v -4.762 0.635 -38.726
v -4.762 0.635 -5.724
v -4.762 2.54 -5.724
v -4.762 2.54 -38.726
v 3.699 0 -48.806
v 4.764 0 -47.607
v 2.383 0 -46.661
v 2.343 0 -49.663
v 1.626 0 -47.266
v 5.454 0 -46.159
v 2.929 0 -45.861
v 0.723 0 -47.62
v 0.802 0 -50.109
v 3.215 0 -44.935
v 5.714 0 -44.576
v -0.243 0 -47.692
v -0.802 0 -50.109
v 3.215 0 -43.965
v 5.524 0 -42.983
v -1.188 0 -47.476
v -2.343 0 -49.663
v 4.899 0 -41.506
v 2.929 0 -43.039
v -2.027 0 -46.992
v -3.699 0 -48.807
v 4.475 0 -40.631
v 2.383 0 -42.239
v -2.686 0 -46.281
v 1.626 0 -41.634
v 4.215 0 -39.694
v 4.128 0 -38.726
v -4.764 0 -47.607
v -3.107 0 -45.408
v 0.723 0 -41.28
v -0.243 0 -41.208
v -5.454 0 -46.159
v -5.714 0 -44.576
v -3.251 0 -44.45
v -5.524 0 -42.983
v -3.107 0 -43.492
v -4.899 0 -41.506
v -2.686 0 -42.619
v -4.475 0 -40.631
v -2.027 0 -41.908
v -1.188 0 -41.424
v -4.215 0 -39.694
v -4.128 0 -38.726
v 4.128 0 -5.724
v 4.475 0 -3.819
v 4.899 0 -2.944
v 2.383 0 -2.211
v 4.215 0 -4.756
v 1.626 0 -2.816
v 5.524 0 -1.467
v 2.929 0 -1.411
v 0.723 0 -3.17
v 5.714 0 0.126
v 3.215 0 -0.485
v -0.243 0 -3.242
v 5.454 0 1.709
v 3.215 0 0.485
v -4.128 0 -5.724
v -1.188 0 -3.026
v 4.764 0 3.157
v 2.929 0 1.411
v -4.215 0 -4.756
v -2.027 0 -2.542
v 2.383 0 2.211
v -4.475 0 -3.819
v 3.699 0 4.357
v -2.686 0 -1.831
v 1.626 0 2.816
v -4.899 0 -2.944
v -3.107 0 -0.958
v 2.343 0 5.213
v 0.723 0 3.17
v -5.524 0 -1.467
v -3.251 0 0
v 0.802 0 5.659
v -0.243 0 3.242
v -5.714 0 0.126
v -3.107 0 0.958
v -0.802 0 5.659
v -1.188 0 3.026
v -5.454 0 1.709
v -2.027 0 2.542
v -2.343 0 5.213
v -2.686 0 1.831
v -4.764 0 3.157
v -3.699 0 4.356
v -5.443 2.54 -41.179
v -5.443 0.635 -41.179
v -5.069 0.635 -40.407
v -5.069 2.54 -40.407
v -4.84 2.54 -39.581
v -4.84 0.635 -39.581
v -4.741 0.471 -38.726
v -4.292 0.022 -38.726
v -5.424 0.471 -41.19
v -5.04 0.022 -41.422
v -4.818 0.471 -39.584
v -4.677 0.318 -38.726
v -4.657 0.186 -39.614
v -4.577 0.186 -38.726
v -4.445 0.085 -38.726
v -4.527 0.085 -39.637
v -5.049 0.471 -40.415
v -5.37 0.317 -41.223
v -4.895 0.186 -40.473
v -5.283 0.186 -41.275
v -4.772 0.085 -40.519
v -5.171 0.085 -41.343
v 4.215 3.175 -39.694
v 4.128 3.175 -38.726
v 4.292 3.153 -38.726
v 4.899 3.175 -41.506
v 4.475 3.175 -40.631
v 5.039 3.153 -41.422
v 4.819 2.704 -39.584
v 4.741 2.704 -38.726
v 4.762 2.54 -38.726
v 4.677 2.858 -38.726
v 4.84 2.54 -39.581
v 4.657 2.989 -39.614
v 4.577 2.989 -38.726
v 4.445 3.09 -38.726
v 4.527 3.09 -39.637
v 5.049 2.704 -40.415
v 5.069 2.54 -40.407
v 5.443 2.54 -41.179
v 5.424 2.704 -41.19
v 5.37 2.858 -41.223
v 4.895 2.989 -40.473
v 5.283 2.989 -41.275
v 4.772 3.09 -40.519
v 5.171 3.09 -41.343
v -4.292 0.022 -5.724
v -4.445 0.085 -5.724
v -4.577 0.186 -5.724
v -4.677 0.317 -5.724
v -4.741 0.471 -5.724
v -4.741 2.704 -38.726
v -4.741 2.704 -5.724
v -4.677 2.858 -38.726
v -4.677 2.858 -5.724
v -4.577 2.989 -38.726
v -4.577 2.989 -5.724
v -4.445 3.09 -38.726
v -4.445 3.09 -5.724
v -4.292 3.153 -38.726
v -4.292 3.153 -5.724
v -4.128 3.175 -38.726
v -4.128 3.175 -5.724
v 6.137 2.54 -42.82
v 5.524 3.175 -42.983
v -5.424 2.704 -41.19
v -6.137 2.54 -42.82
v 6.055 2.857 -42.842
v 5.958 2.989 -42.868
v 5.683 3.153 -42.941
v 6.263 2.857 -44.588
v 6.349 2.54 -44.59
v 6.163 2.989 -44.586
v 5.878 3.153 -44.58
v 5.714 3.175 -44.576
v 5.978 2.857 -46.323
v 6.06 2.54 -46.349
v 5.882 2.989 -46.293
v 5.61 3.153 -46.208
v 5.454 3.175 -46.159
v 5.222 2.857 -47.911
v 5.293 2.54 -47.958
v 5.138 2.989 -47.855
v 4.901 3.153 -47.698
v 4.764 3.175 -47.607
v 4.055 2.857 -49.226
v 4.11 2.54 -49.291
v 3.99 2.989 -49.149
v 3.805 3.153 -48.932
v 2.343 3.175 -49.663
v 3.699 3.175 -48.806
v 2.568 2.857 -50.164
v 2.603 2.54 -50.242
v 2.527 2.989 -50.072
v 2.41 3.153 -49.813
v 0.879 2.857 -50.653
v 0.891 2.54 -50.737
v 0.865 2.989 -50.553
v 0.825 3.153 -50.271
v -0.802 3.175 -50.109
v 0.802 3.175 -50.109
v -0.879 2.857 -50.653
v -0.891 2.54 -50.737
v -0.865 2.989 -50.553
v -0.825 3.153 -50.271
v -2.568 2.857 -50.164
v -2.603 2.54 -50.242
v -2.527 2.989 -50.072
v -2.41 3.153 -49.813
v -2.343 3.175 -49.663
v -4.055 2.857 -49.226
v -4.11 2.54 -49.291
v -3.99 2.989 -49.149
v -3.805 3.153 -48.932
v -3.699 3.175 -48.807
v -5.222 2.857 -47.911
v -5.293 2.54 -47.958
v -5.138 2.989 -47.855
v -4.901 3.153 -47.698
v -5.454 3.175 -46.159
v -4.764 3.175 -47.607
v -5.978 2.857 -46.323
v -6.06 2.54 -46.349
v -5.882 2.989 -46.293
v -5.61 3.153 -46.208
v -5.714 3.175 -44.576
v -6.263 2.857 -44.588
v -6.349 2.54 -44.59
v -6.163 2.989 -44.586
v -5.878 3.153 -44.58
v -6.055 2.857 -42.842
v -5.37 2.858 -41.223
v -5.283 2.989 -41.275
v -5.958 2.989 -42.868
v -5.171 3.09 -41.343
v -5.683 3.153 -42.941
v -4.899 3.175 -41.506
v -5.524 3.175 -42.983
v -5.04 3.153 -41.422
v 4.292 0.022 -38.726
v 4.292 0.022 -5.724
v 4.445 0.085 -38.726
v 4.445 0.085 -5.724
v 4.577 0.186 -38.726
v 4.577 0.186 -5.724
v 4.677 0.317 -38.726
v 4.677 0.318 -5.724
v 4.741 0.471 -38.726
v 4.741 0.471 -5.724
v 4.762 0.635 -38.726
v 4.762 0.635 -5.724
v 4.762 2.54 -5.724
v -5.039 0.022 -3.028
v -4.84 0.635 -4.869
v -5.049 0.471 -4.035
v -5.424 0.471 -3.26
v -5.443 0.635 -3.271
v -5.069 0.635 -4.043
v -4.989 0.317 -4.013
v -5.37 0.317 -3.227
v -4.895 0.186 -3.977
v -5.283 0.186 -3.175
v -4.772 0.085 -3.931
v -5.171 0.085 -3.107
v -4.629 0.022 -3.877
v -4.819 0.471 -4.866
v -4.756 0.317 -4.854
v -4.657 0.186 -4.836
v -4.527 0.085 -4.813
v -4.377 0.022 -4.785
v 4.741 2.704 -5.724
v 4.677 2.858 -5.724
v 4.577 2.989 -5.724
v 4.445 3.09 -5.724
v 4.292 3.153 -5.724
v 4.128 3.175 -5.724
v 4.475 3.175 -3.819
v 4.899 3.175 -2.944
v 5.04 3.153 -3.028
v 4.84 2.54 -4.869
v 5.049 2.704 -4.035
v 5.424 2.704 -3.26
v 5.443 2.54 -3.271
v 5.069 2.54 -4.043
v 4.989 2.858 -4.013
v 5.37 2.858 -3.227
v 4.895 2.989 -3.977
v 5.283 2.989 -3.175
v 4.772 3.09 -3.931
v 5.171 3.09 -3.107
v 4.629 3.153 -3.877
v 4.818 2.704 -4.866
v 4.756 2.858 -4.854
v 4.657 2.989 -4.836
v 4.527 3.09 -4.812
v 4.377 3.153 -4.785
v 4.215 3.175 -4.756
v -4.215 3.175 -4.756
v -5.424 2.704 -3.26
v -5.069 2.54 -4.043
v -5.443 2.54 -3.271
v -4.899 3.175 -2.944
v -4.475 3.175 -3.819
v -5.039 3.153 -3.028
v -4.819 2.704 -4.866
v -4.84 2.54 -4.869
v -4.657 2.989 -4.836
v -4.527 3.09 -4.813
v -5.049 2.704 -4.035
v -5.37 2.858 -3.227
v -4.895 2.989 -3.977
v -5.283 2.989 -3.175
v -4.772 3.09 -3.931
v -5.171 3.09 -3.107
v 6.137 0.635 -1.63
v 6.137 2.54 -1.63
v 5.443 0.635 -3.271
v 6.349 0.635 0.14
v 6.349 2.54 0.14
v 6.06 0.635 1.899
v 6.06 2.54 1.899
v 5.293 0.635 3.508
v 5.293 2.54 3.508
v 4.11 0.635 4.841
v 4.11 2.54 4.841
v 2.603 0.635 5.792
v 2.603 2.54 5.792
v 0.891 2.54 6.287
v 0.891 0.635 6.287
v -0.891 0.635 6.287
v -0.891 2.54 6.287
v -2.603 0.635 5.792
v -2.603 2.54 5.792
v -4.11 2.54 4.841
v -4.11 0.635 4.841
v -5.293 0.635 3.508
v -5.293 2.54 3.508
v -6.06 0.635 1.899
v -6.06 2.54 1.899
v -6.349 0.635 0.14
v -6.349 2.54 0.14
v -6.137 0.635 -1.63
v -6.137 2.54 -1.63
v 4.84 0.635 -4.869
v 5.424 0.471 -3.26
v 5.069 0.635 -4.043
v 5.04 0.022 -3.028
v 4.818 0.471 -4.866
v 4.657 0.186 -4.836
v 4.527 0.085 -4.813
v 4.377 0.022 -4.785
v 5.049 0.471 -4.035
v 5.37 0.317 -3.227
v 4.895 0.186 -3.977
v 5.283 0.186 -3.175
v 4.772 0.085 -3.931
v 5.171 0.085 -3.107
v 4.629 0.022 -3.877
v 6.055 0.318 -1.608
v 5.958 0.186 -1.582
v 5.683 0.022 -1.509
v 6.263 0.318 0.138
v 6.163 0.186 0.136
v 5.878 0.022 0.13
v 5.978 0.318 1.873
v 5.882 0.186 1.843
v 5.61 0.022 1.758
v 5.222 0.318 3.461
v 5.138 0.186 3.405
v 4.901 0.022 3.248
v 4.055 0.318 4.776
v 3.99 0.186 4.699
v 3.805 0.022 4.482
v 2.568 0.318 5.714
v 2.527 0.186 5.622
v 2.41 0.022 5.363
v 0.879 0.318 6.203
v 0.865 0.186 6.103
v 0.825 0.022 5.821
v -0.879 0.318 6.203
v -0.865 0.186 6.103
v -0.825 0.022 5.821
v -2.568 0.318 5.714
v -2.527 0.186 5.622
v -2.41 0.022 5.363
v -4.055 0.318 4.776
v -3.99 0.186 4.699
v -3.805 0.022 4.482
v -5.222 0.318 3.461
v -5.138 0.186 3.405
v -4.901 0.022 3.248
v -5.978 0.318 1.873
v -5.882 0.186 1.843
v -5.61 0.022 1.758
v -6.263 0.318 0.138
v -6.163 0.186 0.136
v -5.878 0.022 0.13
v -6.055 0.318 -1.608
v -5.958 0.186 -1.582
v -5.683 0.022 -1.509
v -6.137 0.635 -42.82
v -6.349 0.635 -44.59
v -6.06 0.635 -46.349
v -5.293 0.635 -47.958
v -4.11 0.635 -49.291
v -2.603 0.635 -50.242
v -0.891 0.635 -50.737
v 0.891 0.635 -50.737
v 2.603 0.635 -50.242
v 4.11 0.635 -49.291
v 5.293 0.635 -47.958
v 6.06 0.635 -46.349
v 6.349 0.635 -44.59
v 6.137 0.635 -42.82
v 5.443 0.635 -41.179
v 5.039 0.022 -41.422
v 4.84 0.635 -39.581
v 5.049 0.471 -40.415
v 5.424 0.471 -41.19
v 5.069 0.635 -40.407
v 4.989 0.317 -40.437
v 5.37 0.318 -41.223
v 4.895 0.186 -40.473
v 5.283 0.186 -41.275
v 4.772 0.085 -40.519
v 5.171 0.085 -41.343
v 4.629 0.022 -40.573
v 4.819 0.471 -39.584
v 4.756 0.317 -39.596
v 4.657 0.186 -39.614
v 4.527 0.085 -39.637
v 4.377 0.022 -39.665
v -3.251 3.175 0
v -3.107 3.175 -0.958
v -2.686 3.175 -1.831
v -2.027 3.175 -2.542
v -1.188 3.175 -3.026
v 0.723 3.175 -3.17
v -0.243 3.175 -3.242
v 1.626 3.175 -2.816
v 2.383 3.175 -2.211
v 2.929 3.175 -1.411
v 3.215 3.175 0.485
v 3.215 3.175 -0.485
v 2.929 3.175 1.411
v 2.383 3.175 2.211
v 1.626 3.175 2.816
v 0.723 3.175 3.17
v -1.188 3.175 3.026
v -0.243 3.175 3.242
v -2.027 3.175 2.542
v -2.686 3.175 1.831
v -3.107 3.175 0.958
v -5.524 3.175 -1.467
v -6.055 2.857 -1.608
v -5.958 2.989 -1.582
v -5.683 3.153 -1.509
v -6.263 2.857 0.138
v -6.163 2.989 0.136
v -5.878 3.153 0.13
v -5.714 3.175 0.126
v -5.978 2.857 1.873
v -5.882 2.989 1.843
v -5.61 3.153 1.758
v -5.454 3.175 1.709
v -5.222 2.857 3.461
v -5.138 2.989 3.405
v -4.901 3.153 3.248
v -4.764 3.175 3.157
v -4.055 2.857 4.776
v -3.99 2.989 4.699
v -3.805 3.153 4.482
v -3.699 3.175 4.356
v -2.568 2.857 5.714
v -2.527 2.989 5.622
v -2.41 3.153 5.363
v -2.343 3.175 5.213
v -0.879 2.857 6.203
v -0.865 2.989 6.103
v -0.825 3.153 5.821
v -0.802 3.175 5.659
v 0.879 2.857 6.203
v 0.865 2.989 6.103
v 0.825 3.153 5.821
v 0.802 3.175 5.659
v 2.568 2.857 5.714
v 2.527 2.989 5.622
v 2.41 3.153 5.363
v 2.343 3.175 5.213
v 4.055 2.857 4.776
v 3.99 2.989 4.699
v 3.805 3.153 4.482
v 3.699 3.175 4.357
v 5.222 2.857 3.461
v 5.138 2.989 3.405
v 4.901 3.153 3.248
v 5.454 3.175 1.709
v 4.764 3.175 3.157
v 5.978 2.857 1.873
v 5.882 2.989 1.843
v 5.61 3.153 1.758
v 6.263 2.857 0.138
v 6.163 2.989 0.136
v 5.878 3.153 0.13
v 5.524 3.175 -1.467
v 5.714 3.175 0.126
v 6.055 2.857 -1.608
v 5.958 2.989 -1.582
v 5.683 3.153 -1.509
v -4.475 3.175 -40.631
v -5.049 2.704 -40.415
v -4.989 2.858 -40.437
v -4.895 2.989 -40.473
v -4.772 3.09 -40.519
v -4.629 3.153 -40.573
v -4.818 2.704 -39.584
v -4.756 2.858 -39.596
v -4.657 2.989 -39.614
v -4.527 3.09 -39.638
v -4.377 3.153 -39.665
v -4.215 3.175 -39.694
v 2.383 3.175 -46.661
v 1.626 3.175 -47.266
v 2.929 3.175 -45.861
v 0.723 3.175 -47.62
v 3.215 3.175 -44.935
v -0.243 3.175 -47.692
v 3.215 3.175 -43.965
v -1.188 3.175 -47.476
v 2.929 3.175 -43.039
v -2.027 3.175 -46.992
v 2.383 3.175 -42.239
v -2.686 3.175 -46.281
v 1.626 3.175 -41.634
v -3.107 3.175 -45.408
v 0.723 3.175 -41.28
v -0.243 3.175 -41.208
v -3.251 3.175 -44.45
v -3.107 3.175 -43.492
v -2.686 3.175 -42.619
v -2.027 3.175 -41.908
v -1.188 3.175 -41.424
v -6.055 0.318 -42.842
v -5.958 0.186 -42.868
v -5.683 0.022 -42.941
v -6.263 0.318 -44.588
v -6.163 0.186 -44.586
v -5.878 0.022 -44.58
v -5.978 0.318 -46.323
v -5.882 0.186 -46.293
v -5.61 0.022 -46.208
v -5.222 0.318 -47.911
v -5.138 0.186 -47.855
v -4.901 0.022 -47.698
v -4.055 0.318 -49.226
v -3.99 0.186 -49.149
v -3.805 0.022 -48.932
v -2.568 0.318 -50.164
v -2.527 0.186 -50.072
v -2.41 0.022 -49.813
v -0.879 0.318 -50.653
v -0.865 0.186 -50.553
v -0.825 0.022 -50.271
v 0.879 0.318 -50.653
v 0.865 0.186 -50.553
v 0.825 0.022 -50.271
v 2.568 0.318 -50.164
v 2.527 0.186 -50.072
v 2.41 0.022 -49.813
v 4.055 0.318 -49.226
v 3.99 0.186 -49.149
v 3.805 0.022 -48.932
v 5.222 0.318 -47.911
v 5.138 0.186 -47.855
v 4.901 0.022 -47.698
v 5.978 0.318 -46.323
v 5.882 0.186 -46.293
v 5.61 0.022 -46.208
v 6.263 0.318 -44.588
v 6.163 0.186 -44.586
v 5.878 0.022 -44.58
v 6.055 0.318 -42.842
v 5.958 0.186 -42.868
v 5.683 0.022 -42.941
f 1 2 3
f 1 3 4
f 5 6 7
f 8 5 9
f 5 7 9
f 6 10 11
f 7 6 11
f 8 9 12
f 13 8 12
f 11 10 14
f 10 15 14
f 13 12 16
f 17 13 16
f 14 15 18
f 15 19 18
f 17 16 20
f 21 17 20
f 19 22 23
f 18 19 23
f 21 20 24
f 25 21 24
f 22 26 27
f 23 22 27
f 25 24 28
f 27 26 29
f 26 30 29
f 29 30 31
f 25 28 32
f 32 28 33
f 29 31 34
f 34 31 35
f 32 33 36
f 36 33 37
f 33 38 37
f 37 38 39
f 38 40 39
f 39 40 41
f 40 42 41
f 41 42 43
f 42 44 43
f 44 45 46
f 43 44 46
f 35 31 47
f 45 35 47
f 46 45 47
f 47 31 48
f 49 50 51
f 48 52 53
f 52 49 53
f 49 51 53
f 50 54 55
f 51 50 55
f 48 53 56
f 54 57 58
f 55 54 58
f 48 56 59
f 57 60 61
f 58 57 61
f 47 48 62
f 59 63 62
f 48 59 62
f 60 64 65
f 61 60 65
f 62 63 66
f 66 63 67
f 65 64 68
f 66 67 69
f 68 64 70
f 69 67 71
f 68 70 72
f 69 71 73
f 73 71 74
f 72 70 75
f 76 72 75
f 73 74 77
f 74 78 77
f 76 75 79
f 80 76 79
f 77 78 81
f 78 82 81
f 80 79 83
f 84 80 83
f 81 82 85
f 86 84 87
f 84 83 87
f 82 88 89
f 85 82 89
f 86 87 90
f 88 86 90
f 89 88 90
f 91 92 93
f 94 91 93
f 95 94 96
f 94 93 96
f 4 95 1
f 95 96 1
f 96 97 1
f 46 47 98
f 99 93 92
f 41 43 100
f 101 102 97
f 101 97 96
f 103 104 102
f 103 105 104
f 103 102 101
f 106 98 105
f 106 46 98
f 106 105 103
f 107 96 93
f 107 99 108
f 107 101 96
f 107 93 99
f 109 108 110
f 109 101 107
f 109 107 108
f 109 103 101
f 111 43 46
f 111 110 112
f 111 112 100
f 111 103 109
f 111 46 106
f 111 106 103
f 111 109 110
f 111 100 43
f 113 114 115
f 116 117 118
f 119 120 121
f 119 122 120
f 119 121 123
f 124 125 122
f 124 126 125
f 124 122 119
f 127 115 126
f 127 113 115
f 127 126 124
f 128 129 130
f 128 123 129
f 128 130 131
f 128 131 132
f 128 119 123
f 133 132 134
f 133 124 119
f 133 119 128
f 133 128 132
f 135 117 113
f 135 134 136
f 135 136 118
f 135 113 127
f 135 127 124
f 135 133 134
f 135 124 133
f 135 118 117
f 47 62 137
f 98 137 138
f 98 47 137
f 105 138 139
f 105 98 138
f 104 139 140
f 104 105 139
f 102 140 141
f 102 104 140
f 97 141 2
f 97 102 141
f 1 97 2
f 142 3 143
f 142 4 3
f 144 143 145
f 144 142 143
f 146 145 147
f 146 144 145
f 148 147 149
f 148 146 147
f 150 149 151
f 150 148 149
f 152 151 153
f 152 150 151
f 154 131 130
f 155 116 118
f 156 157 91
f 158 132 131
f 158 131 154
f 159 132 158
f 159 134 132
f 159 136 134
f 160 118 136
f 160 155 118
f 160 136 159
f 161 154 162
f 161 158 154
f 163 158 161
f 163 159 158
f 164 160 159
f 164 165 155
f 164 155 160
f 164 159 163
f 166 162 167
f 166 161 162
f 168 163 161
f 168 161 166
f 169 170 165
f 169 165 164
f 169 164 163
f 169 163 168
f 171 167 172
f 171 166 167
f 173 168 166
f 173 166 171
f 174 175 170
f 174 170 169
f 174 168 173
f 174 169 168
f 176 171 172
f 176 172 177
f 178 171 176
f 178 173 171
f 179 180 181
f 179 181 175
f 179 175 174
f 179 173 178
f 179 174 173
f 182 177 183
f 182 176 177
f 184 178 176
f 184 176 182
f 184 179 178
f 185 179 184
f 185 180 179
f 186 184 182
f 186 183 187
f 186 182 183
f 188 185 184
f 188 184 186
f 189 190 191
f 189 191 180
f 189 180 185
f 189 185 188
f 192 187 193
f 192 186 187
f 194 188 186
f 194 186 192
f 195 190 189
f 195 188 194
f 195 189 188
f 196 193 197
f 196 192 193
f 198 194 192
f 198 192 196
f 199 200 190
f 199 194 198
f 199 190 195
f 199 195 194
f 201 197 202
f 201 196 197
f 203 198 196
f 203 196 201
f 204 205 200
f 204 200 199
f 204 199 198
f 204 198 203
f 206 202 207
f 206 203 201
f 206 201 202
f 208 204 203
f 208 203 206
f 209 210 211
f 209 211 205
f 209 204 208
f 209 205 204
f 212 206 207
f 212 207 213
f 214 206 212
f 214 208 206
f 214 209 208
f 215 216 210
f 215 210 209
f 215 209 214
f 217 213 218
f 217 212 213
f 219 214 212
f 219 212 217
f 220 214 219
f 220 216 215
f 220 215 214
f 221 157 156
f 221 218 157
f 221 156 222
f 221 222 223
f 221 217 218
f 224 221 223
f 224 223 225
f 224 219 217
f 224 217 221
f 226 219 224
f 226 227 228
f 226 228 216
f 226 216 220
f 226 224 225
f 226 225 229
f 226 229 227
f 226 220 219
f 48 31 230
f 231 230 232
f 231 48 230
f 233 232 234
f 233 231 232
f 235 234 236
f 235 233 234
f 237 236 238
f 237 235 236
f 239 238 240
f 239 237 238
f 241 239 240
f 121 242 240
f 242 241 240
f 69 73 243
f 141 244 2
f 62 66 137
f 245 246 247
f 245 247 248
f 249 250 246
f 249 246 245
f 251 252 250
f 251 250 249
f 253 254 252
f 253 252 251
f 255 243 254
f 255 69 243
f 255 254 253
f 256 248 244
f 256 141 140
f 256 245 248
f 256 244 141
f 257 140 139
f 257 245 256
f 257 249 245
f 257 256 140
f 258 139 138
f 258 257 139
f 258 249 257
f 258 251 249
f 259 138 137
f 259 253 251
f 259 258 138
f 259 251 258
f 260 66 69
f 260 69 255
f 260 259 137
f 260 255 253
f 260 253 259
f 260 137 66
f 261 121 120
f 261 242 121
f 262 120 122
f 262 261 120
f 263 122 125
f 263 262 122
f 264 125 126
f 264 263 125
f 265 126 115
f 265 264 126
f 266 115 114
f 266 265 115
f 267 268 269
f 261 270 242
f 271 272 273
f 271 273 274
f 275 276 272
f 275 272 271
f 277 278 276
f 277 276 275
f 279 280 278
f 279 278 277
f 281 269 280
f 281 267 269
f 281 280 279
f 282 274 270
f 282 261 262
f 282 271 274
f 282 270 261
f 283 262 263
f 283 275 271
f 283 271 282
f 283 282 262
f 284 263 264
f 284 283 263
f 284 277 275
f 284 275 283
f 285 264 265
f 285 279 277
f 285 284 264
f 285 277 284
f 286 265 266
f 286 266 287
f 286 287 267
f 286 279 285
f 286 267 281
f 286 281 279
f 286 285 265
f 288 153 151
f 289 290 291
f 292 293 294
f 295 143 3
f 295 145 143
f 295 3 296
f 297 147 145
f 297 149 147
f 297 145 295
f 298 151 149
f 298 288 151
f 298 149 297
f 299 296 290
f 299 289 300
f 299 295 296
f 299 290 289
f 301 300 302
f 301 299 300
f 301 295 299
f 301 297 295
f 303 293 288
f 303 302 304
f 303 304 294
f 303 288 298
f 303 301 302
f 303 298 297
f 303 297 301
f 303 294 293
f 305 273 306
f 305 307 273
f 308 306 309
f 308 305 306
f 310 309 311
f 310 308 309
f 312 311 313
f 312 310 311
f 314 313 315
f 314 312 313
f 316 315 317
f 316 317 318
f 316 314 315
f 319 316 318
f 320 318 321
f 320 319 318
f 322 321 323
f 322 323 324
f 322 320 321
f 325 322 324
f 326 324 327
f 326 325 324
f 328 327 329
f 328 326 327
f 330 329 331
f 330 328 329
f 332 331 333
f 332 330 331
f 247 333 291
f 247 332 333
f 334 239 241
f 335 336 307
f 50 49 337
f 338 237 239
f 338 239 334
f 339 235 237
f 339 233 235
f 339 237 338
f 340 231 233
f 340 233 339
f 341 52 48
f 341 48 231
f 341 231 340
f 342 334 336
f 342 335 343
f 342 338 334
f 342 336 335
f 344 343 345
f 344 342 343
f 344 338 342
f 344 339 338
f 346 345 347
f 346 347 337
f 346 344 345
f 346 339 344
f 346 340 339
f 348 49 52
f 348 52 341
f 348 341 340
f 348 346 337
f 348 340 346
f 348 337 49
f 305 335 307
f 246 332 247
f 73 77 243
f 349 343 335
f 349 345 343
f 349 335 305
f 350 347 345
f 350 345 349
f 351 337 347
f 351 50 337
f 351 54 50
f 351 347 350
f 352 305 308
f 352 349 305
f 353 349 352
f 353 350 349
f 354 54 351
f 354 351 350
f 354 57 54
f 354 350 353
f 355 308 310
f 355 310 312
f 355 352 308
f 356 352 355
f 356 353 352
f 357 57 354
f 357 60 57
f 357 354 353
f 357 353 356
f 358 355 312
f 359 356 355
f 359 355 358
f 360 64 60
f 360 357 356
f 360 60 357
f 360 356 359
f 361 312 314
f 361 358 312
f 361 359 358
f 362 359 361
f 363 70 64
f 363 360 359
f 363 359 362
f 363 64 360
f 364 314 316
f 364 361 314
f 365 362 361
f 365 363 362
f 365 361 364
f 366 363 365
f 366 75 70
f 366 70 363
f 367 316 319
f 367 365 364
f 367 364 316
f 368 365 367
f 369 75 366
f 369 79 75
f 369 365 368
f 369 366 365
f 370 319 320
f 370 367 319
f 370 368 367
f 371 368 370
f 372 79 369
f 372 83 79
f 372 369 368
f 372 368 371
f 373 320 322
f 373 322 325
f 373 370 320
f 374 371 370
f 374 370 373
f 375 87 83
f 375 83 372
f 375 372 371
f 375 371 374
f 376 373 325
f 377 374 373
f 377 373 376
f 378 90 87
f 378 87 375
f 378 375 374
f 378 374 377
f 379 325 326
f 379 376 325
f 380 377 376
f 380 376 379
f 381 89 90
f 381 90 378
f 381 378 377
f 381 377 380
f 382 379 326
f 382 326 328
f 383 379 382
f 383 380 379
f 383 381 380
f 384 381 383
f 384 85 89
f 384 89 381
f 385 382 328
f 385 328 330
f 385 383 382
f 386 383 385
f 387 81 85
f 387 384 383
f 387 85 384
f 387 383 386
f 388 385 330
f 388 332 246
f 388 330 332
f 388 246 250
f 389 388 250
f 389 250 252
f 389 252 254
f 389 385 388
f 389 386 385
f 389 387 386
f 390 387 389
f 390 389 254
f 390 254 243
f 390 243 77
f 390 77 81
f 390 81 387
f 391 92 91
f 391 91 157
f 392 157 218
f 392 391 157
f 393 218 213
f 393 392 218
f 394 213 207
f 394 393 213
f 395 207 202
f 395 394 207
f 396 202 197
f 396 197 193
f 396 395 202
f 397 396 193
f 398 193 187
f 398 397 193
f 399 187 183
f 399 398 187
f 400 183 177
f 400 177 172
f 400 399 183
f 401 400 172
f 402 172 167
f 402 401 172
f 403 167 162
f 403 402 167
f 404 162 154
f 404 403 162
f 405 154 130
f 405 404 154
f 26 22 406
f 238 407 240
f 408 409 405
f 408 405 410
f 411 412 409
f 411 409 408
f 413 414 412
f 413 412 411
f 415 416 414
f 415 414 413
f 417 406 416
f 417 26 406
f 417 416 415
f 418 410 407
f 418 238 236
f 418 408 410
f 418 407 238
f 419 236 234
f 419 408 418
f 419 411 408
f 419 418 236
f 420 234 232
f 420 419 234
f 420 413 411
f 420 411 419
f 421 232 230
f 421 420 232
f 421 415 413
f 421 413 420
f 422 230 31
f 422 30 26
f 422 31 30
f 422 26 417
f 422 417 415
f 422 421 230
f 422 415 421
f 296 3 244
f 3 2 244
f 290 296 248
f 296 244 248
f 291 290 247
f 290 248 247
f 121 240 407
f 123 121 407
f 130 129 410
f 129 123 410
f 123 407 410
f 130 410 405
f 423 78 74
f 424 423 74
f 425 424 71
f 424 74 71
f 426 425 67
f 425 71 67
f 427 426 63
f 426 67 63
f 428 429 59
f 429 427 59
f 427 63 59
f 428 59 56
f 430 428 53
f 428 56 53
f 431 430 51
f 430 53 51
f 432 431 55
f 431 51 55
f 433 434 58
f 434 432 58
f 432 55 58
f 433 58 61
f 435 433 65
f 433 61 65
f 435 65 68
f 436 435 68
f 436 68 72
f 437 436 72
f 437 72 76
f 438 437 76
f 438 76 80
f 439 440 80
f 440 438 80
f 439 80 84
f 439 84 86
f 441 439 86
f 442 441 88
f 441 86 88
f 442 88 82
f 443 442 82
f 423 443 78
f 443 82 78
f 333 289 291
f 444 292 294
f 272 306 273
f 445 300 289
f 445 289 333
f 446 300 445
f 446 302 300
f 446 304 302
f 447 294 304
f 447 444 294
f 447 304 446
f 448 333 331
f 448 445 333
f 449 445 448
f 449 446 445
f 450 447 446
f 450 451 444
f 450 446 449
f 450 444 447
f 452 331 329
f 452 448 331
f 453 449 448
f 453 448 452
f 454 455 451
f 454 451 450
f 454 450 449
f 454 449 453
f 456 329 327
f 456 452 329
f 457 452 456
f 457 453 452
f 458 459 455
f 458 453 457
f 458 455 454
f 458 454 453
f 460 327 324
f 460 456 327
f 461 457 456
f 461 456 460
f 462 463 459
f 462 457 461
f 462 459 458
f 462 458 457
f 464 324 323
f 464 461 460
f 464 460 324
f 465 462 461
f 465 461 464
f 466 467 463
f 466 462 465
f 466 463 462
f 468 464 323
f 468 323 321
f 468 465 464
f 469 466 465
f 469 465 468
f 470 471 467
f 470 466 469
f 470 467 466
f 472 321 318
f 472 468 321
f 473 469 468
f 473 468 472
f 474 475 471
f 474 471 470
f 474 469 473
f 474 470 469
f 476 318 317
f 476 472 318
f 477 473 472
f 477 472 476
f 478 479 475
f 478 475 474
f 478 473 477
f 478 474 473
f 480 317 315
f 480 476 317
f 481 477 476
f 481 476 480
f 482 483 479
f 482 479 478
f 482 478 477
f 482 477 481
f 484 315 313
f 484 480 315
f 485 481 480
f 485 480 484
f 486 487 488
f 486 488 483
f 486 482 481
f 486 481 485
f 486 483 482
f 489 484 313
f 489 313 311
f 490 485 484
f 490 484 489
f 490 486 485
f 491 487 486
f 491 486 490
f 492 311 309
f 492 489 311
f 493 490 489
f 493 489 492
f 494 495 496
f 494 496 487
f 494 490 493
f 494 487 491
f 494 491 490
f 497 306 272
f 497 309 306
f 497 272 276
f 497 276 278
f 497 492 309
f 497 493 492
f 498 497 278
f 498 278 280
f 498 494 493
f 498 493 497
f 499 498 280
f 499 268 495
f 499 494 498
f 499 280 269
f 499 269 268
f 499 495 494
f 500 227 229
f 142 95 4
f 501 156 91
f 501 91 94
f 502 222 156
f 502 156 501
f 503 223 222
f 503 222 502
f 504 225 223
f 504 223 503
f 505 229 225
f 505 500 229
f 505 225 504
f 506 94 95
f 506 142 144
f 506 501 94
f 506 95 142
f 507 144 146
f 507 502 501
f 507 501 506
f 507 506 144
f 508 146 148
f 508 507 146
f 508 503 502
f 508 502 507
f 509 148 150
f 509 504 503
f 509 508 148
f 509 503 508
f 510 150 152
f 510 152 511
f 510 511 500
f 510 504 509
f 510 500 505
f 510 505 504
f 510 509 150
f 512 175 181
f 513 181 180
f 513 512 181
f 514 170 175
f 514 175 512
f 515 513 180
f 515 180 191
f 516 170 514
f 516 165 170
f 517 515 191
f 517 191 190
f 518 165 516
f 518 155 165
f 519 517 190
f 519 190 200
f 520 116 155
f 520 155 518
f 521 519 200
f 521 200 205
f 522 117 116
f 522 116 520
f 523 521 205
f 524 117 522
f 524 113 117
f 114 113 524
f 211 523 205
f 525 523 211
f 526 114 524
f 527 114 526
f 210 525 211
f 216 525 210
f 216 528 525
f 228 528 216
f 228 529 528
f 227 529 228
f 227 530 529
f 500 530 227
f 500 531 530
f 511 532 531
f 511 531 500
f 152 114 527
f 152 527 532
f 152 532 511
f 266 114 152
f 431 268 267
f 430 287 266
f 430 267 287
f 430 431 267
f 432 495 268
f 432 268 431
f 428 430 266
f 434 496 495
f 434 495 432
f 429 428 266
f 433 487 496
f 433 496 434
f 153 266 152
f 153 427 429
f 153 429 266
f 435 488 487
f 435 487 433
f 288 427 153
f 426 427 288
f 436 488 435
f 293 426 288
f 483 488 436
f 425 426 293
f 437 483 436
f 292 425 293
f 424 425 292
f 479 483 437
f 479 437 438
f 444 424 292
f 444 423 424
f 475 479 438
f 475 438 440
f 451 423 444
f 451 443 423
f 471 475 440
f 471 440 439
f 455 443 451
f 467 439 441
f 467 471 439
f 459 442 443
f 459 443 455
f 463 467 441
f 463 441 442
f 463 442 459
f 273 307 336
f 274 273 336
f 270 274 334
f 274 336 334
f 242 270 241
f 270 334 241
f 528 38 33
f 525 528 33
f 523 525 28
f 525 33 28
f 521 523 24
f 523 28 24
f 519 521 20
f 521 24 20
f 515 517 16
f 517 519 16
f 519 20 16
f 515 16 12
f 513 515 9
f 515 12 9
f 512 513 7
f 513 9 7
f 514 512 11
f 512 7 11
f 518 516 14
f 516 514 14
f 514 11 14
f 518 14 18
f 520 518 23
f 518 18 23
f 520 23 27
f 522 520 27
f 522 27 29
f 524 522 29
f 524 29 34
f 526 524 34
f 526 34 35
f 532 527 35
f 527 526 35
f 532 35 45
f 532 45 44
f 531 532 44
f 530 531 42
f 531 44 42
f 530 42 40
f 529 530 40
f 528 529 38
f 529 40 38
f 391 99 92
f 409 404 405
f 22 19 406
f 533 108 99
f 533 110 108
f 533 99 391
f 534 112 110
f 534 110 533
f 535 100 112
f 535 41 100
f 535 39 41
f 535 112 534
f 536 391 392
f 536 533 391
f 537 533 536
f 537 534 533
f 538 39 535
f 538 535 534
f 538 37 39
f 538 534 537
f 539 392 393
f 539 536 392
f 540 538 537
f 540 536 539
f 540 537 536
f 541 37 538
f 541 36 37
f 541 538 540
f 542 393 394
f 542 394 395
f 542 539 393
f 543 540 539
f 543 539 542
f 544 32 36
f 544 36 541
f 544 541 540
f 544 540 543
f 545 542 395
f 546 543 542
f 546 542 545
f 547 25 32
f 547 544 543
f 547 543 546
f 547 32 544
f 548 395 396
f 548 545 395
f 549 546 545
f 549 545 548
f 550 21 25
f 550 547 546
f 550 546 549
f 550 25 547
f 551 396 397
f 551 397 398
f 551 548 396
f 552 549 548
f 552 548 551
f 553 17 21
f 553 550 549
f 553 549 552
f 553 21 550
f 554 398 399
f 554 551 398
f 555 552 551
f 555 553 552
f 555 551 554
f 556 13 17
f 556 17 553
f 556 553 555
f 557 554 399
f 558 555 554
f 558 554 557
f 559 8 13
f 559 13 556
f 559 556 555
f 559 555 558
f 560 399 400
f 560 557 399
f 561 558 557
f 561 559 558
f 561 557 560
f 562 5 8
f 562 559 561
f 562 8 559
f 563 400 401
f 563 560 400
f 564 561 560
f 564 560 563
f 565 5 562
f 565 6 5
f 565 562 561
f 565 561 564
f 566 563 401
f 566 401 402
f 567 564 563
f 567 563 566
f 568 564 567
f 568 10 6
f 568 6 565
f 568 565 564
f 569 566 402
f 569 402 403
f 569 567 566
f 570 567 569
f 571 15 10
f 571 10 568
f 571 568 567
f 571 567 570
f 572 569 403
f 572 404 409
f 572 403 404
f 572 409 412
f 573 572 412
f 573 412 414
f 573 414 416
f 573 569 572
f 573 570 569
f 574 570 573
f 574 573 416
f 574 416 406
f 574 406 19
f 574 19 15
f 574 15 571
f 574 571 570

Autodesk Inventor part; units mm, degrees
ref_plane "YZ Plane" through (0, 0, 0) normal (1, 0, 0) x (0, 1, 0)
ref_plane "XZ Plane" through (0, 0, 0) normal (0, 1, 0) x (-1, 0, 0)
ref_plane "XY Plane" through (0, 0, 0) normal (0, 0, 1) x (1, 0, 0)
sketch "Sketch1" plane through (0, 0, 0) normal (0, 1, 0) x (-1, 0, 0)
  circle A0 centre (0, 0) radius 3.2512
  circle A1 centre (0, -44.45) radius 3.2512
  circle A2 centre (0, 0) radius 6.35 construction
  circle A3 centre (0, -44.45) radius 6.35 construction
  line L0 (0, -6.35) -> (0, -38.1) construction
  line L1 (4.7625, -5.7238) -> (4.7625, -38.7262)
  line L2 (-4.7625, -5.7238) -> (-4.7625, -38.7262)
  arc A4 (5.4429, -3.2708) -> (-5.4429, -3.2708) centre (0, 0) ccw
  arc A5 (-5.4429, -41.1792) -> (5.4429, -41.1792) centre (0, -44.45) ccw
  arc A6 (5.4429, -3.2708) -> (4.7625, -5.7238) centre (9.525, -5.7238) ccw
  arc A7 (-4.7625, -5.7238) -> (-5.4429, -3.2708) centre (-9.525, -5.7238) ccw
  arc A8 (-5.4429, -41.1792) -> (-4.7625, -38.7262) centre (-9.525, -38.7262) ccw
  arc A9 (4.7625, -38.7262) -> (5.4429, -41.1792) centre (9.525, -38.7262) ccw
  point P0 (4.7625, -4.2001)
  point P1 (4.7625, -40.2499)
  point P2 (-4.7625, -4.2001)
  point P3 (-4.7625, -40.2499)
  dimension "d0" = 6.5024
  dimension "d1" = 44.45
  dimension "d2" = 12.7
  dimension "d3" = 4.7625
  dimension "d4" = 4.7625
  dimension "d5" = 4.7625
extrude "Extrusion1" add sketch "Sketch1" along normal blind 3.175
fillet "Fillet1" radius 0.635 16 edges at (-4.9357, 3.175, -4.451) (0, 3.175, 6.35) (4.9357, 3.175, -4.451) (4.7625, 3.175, -22.225) (4.9357, 3.175, -39.999) (0, 3.175, -50.8) (-4.9357, 3.175, -39.999) (-4.7625, 3.175, -22.225) (-4.9357, 0, -4.451) (0, 0, 6.35) (4.9357, 0, -4.451) (4.7625, 0, -22.225) (4.9357, 0, -39.999) (0, 0, -50.8) (-4.9357, 0, -39.999) (-4.7625, 0, -22.225)
properties part number "ELEV_044_CFSPRINGHOLDER" material "Aluminum 6061"
